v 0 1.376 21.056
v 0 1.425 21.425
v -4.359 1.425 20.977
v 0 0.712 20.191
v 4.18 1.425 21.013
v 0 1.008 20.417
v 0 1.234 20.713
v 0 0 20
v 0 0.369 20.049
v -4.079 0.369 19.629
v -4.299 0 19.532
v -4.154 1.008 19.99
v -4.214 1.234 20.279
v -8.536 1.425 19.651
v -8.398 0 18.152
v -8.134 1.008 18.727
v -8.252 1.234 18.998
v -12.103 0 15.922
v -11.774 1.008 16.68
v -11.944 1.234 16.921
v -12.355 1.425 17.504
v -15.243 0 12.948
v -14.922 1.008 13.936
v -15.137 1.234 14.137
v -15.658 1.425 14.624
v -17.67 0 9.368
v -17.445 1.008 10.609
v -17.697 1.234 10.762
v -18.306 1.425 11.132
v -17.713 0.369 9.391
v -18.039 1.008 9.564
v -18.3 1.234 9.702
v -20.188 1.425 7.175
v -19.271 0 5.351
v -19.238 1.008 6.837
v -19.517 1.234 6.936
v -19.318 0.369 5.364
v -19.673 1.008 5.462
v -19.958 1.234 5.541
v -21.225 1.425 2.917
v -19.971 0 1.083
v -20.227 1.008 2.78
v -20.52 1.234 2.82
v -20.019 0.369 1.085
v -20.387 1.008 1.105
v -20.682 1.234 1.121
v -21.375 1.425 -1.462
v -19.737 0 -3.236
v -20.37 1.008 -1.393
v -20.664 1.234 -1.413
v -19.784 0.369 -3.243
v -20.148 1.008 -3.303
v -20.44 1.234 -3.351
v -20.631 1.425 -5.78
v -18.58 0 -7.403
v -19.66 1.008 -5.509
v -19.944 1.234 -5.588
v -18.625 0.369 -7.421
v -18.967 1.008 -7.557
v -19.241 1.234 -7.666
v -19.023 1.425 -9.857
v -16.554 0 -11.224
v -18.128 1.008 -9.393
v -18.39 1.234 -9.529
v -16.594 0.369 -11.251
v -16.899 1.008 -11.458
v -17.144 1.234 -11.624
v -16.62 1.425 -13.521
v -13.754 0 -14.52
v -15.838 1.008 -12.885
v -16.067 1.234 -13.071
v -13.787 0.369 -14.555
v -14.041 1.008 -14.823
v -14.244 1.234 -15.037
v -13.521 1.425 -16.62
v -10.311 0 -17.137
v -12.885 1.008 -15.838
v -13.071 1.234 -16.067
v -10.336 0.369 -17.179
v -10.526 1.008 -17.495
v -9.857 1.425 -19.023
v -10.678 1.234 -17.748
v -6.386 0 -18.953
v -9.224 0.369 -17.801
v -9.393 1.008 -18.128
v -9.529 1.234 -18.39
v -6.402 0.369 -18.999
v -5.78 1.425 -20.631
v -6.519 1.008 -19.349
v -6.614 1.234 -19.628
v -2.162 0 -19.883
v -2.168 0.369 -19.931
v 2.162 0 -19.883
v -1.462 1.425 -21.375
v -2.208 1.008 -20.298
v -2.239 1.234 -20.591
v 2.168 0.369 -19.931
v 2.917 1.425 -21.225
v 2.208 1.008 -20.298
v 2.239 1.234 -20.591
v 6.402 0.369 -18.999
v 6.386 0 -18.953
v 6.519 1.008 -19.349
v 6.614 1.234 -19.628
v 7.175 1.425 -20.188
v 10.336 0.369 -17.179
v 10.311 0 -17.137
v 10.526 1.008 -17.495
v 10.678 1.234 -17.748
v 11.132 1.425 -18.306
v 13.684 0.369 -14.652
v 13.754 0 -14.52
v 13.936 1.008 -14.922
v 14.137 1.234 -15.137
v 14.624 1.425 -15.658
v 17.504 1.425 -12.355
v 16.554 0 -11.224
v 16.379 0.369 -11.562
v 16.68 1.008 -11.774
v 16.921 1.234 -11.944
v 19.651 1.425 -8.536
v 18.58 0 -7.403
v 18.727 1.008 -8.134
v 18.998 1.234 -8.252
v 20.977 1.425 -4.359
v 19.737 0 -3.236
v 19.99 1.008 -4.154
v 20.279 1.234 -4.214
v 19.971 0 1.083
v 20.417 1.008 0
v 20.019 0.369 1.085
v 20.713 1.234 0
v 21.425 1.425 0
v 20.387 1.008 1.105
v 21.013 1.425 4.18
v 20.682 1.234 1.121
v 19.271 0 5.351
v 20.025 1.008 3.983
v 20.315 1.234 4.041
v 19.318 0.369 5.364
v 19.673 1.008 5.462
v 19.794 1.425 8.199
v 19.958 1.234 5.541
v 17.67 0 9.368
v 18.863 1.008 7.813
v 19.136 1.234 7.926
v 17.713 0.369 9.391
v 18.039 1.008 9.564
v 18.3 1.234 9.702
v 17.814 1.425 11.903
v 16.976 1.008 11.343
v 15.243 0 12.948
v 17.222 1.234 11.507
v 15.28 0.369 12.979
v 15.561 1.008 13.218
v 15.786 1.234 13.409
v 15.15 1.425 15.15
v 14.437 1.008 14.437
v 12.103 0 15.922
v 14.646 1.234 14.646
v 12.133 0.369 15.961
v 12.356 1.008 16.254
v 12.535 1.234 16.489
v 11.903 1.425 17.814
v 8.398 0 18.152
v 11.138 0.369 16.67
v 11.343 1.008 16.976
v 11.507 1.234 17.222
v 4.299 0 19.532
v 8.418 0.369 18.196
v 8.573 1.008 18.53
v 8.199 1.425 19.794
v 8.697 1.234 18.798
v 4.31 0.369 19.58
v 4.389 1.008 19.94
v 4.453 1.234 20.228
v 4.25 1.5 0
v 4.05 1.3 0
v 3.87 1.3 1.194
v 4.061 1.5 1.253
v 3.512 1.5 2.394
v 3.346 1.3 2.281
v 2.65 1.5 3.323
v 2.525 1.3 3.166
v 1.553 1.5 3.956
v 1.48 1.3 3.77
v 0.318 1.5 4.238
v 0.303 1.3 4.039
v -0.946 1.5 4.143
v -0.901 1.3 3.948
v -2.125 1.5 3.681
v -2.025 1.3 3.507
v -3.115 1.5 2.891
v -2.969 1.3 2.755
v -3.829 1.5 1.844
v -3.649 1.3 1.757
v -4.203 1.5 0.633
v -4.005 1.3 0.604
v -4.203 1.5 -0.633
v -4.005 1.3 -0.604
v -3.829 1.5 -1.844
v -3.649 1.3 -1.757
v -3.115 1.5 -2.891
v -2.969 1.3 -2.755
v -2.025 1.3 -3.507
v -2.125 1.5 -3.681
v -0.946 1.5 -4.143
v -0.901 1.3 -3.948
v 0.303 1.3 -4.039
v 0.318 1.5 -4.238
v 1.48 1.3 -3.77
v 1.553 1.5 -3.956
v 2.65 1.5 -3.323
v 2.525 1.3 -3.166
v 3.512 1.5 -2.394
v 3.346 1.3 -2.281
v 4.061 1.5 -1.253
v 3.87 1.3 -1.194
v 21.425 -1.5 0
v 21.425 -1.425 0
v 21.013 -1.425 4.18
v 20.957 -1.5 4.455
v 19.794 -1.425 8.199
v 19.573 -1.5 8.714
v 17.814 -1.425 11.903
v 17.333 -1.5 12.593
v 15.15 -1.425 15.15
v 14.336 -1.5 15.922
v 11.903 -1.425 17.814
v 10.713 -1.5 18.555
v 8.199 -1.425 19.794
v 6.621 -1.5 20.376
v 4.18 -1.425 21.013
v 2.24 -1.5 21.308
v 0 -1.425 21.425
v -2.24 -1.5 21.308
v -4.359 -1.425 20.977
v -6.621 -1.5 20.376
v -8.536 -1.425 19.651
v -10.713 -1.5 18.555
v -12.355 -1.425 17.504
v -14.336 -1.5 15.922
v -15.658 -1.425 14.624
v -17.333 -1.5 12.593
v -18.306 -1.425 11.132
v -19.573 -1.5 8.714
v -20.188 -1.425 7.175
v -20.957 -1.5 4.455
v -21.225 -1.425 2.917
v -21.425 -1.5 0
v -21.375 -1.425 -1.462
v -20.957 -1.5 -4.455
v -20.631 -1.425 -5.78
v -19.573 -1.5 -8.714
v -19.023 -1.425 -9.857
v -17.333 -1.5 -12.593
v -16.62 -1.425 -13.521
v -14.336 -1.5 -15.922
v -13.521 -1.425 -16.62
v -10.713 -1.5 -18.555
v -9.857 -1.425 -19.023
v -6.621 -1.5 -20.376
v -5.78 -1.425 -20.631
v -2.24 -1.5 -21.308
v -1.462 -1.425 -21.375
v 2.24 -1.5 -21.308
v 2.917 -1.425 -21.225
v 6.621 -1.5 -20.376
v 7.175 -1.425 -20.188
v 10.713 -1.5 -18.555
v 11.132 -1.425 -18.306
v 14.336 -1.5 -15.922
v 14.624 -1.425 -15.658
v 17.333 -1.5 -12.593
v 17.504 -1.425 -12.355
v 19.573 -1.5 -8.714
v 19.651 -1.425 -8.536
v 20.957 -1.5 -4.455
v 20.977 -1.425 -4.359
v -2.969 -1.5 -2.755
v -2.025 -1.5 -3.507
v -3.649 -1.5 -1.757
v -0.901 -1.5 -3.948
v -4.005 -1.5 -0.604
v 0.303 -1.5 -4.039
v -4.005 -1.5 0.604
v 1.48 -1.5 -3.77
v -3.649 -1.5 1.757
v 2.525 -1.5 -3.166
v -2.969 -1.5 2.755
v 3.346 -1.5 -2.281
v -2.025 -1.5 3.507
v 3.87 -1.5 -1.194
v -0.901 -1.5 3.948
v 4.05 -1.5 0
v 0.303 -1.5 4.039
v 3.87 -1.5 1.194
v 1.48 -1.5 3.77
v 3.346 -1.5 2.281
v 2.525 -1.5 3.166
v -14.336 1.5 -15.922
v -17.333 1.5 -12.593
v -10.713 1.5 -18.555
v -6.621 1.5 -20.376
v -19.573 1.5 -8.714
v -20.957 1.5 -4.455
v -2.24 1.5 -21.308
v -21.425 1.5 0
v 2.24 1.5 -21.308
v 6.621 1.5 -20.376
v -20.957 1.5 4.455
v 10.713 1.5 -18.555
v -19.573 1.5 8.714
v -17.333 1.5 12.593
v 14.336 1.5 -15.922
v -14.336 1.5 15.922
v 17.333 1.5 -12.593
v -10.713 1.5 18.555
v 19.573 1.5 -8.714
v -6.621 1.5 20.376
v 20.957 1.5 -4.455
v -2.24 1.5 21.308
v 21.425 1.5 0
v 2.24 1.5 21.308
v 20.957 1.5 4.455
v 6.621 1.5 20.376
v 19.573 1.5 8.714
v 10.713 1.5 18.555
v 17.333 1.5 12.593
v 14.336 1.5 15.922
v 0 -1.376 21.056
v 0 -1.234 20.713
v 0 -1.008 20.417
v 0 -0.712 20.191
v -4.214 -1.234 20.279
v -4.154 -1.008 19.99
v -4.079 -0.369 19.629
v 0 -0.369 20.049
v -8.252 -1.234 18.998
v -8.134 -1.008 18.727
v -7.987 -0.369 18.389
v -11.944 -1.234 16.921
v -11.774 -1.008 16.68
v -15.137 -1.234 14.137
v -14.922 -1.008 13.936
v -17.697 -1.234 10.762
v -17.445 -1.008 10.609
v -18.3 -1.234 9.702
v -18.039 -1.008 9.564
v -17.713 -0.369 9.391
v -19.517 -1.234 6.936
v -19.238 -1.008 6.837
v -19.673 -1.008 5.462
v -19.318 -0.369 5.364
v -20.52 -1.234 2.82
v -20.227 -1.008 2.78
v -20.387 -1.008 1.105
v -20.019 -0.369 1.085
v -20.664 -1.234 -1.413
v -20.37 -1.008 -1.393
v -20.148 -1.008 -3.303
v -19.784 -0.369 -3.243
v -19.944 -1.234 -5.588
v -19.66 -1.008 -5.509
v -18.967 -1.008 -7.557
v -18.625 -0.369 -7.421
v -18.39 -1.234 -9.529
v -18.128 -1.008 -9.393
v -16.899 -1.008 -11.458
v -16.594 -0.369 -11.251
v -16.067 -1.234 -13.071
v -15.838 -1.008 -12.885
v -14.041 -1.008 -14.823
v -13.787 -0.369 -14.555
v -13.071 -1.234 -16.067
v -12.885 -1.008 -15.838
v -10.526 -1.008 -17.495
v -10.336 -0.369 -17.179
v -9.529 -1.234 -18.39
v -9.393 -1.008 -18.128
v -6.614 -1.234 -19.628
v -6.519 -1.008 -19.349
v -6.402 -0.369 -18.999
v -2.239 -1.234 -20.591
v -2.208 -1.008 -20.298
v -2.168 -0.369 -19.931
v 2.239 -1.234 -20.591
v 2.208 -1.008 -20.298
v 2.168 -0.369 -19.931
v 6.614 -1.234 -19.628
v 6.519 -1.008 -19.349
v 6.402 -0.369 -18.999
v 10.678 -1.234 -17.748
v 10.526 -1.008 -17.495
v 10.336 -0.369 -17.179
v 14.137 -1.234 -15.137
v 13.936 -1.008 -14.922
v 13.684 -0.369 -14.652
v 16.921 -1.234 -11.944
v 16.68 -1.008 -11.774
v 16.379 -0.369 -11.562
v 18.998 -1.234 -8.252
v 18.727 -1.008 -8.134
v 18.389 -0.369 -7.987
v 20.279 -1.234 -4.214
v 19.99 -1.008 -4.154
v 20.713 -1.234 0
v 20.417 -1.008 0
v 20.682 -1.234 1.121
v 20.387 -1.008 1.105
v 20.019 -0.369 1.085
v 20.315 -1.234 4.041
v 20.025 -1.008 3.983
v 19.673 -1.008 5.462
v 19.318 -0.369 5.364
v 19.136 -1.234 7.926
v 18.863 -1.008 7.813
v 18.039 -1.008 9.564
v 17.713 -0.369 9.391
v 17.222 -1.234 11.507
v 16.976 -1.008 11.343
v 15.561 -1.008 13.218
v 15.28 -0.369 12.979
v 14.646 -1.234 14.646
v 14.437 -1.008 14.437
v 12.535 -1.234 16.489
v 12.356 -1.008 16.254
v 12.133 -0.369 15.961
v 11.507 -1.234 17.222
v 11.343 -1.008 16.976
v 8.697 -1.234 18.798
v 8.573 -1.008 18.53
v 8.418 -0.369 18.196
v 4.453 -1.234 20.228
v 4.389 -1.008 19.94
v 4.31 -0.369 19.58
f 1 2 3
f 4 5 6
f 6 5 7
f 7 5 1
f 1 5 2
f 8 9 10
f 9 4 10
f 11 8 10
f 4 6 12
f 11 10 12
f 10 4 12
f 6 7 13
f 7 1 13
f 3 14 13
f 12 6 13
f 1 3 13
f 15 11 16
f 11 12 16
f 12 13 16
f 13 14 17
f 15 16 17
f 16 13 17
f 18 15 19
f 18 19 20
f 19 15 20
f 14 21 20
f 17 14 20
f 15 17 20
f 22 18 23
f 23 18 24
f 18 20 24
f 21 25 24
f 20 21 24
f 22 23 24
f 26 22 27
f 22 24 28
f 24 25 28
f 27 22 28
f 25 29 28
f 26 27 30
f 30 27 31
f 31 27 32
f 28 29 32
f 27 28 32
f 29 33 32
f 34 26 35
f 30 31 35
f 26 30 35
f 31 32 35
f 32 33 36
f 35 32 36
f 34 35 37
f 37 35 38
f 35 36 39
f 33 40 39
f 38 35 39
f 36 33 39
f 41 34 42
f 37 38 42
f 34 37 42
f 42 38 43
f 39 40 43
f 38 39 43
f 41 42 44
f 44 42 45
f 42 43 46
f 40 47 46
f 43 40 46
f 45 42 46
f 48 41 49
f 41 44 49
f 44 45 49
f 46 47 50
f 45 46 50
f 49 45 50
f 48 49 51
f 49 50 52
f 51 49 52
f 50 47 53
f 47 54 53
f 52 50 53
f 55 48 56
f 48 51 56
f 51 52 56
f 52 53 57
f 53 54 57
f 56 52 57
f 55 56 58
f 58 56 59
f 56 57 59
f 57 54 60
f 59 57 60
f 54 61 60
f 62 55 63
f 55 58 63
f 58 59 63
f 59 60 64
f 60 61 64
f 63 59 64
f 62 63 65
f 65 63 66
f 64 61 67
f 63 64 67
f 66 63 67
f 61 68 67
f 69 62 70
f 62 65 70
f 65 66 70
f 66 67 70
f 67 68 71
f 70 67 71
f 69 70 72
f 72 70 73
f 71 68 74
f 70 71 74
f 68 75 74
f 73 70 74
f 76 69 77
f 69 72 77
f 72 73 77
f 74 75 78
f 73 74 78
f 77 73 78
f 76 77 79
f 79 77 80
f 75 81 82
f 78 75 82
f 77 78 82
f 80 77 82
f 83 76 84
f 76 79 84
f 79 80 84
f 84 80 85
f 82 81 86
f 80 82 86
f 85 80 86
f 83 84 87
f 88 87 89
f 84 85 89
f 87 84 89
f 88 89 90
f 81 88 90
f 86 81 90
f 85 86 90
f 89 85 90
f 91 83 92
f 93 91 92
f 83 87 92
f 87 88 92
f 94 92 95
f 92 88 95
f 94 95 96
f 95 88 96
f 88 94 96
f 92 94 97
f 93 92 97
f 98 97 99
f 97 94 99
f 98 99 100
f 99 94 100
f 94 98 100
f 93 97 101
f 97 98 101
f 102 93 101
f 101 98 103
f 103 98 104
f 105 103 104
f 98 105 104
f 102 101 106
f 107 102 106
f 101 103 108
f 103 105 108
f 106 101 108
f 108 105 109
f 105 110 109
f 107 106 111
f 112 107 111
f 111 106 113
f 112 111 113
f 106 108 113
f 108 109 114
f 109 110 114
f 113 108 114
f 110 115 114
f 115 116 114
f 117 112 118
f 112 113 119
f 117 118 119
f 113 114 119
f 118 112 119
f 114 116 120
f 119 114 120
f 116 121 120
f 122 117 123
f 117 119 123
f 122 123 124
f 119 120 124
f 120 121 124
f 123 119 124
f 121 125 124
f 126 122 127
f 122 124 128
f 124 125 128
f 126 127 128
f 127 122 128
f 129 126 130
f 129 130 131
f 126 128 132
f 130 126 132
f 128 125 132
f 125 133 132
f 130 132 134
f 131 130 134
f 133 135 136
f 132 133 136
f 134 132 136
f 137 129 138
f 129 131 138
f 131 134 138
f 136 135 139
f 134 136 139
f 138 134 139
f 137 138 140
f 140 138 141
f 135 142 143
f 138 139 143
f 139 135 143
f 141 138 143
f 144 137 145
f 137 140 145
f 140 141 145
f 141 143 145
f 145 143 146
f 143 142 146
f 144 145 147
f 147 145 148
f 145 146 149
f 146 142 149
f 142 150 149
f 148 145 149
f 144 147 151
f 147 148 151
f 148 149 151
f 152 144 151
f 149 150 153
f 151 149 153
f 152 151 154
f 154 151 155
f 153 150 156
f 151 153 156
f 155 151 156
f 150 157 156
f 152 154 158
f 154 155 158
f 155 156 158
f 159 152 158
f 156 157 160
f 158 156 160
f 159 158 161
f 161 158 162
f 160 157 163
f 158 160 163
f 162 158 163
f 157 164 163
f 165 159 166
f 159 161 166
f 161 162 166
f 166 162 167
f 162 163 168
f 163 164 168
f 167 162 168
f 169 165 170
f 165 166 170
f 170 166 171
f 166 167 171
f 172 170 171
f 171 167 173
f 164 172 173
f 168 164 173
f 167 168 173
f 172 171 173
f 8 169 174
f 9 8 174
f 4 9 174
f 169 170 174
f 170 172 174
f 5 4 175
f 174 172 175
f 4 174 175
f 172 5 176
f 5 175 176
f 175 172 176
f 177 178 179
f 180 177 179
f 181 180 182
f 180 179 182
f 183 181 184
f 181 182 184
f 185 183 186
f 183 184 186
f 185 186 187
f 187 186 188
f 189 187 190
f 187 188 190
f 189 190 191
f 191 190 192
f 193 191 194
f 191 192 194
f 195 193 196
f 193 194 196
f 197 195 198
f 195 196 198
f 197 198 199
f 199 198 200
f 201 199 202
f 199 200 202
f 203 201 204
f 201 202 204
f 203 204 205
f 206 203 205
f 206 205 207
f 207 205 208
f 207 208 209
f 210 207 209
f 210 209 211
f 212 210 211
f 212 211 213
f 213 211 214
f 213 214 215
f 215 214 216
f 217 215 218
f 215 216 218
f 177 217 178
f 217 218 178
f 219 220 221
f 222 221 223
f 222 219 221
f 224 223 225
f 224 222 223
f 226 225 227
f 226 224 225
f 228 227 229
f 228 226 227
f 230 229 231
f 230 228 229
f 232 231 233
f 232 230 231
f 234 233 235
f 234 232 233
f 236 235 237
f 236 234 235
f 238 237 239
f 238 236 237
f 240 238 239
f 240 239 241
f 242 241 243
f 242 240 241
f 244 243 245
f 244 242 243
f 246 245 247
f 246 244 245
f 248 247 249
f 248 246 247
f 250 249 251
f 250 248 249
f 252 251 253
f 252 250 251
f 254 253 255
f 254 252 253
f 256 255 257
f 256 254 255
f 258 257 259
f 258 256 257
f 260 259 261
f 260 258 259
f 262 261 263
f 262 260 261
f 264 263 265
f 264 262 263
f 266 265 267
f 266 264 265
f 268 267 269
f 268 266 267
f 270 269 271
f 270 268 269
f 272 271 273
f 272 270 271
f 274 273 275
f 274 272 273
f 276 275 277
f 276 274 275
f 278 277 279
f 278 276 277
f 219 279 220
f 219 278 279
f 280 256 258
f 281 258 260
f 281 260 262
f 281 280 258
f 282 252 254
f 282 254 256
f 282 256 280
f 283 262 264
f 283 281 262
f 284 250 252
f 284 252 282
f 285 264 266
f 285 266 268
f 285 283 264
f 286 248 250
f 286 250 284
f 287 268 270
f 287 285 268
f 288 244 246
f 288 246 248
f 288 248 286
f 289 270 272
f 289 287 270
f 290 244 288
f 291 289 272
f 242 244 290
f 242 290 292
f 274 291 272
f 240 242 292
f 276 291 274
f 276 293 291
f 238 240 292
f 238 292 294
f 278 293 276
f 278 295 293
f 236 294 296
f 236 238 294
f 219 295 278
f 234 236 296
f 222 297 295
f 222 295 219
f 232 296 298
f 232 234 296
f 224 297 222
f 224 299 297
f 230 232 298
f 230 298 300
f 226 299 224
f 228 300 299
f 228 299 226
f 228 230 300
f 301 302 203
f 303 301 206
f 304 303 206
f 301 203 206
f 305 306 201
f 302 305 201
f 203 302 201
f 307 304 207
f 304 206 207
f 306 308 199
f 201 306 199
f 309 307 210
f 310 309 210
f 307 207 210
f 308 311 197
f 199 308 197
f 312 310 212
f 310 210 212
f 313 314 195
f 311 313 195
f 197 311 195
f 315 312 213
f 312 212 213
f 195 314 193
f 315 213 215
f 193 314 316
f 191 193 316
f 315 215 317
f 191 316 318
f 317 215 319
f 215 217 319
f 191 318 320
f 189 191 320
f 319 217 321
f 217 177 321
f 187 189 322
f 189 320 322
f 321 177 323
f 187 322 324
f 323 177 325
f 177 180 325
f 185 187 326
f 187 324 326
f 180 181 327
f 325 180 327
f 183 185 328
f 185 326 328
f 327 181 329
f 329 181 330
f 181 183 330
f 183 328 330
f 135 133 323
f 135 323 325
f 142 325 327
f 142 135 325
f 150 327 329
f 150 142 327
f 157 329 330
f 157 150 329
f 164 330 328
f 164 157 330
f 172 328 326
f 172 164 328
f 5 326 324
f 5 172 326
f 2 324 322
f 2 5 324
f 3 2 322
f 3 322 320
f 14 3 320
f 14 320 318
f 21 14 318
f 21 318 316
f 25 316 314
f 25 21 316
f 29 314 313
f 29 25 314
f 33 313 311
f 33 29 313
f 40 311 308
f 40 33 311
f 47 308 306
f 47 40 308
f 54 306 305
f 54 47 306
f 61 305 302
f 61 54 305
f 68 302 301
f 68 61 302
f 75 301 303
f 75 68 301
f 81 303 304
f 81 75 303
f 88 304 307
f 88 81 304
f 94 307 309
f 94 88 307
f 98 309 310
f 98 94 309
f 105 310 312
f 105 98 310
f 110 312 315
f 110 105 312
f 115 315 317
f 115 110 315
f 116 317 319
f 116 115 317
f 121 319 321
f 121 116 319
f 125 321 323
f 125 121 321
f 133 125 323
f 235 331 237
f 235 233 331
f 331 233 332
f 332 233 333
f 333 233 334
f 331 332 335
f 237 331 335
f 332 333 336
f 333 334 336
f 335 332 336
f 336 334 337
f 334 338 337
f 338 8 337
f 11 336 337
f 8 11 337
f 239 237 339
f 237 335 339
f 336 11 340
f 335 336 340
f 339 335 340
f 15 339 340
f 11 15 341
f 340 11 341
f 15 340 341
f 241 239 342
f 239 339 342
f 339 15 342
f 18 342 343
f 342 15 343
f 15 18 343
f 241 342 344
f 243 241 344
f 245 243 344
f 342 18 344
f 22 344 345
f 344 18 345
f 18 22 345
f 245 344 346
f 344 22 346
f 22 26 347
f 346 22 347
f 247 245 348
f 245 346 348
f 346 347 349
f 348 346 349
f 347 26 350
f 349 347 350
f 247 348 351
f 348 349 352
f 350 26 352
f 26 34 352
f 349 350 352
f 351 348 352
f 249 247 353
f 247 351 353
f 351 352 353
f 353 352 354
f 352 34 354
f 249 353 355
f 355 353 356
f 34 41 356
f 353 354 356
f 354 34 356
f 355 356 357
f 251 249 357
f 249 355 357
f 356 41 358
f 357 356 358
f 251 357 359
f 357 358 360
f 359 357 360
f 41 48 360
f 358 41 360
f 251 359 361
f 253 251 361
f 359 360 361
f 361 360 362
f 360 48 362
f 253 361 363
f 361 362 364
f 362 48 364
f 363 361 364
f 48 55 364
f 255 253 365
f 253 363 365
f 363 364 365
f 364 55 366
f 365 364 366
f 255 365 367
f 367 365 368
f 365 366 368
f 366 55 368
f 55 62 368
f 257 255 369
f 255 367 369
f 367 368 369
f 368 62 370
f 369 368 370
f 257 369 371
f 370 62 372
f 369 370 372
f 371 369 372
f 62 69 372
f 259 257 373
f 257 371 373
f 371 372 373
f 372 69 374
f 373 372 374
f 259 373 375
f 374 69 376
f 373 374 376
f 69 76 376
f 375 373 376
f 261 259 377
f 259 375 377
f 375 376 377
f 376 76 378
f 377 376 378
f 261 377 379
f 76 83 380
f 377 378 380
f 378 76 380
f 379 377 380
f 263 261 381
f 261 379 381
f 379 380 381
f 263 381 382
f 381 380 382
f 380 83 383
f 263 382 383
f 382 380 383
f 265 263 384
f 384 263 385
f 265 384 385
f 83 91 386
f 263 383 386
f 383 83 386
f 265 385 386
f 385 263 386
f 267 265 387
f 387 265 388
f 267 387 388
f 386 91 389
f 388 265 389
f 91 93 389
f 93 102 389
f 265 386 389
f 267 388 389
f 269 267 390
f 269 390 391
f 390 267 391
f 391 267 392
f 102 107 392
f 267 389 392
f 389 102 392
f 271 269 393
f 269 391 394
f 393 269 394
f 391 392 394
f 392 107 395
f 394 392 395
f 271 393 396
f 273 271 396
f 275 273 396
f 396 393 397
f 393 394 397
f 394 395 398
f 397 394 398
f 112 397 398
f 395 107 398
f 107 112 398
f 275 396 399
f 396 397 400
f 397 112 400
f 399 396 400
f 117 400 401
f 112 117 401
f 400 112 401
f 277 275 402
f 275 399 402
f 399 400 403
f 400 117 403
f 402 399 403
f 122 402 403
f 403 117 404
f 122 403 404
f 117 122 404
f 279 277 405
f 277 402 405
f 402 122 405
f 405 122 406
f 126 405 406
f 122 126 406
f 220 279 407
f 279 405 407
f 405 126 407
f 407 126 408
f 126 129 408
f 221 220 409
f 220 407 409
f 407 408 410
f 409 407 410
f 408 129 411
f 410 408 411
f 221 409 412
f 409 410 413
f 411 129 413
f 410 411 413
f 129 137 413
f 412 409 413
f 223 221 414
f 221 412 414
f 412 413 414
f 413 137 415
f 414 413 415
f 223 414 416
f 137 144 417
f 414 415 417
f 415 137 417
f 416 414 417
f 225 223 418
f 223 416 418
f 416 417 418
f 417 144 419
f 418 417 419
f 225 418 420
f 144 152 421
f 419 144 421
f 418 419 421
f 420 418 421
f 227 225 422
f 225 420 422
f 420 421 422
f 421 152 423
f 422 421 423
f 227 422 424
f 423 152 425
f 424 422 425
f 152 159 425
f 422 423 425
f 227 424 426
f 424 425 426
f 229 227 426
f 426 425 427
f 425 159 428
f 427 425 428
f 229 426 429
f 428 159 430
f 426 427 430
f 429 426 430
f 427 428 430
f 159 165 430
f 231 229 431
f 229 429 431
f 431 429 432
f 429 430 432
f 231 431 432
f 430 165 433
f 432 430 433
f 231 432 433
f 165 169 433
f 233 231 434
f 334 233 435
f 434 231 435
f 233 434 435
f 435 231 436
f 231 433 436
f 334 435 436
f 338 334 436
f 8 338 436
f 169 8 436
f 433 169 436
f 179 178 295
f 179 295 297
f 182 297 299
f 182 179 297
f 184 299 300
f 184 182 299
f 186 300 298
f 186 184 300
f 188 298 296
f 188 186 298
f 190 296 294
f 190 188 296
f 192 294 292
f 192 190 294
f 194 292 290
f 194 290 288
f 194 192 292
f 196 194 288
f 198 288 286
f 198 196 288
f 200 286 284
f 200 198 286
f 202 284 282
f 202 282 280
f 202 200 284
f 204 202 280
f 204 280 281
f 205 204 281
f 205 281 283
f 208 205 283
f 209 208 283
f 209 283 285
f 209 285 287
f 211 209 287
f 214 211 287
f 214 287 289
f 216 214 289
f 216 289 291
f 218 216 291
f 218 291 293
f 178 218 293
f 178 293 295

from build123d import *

# Parameters (mm, degrees)
F0_R     = 21.425
F0_R_2   = 4.05
F1_DEPTH = 1.5
F4_SIZE  = 0.2


with BuildPart() as f1:
    # F0 (on Front) → F1 (new body, symmetric)
    with BuildSketch(Plane.XZ):
        Circle(F0_R)
        Circle(F0_R_2, mode=Mode.SUBTRACT)
    extrude(amount=F1_DEPTH, both=True)

    # F2 (on Right) → F3 (revolve, cut)
    with BuildSketch(Plane.YZ):
        with BuildLine():
            ThreePointArc((-1.425, 21.425), (-1.007627, 20.417373), (0, 20))
            Line((0, 20), (0, 21.425))
            Line((0, 21.425), (-1.425, 21.425))
        make_face()
        with BuildLine():
            Line((0, 21.425), (0, 20))
            ThreePointArc((0, 20), (1.007627, 20.417373), (1.425, 21.425))
            Line((1.425, 21.425), (0, 21.425))
        make_face()
    revolve(axis=Axis((0, -4.904328, 0), (0, -1, 0)), mode=Mode.SUBTRACT)

    # F4
    f4_edges = [f1.edges().sort_by_distance(p)[0] for p in [
        (-4.05, 1.5, 0),
    ]]
    chamfer(f4_edges, length=F4_SIZE)


solid = f1.part
